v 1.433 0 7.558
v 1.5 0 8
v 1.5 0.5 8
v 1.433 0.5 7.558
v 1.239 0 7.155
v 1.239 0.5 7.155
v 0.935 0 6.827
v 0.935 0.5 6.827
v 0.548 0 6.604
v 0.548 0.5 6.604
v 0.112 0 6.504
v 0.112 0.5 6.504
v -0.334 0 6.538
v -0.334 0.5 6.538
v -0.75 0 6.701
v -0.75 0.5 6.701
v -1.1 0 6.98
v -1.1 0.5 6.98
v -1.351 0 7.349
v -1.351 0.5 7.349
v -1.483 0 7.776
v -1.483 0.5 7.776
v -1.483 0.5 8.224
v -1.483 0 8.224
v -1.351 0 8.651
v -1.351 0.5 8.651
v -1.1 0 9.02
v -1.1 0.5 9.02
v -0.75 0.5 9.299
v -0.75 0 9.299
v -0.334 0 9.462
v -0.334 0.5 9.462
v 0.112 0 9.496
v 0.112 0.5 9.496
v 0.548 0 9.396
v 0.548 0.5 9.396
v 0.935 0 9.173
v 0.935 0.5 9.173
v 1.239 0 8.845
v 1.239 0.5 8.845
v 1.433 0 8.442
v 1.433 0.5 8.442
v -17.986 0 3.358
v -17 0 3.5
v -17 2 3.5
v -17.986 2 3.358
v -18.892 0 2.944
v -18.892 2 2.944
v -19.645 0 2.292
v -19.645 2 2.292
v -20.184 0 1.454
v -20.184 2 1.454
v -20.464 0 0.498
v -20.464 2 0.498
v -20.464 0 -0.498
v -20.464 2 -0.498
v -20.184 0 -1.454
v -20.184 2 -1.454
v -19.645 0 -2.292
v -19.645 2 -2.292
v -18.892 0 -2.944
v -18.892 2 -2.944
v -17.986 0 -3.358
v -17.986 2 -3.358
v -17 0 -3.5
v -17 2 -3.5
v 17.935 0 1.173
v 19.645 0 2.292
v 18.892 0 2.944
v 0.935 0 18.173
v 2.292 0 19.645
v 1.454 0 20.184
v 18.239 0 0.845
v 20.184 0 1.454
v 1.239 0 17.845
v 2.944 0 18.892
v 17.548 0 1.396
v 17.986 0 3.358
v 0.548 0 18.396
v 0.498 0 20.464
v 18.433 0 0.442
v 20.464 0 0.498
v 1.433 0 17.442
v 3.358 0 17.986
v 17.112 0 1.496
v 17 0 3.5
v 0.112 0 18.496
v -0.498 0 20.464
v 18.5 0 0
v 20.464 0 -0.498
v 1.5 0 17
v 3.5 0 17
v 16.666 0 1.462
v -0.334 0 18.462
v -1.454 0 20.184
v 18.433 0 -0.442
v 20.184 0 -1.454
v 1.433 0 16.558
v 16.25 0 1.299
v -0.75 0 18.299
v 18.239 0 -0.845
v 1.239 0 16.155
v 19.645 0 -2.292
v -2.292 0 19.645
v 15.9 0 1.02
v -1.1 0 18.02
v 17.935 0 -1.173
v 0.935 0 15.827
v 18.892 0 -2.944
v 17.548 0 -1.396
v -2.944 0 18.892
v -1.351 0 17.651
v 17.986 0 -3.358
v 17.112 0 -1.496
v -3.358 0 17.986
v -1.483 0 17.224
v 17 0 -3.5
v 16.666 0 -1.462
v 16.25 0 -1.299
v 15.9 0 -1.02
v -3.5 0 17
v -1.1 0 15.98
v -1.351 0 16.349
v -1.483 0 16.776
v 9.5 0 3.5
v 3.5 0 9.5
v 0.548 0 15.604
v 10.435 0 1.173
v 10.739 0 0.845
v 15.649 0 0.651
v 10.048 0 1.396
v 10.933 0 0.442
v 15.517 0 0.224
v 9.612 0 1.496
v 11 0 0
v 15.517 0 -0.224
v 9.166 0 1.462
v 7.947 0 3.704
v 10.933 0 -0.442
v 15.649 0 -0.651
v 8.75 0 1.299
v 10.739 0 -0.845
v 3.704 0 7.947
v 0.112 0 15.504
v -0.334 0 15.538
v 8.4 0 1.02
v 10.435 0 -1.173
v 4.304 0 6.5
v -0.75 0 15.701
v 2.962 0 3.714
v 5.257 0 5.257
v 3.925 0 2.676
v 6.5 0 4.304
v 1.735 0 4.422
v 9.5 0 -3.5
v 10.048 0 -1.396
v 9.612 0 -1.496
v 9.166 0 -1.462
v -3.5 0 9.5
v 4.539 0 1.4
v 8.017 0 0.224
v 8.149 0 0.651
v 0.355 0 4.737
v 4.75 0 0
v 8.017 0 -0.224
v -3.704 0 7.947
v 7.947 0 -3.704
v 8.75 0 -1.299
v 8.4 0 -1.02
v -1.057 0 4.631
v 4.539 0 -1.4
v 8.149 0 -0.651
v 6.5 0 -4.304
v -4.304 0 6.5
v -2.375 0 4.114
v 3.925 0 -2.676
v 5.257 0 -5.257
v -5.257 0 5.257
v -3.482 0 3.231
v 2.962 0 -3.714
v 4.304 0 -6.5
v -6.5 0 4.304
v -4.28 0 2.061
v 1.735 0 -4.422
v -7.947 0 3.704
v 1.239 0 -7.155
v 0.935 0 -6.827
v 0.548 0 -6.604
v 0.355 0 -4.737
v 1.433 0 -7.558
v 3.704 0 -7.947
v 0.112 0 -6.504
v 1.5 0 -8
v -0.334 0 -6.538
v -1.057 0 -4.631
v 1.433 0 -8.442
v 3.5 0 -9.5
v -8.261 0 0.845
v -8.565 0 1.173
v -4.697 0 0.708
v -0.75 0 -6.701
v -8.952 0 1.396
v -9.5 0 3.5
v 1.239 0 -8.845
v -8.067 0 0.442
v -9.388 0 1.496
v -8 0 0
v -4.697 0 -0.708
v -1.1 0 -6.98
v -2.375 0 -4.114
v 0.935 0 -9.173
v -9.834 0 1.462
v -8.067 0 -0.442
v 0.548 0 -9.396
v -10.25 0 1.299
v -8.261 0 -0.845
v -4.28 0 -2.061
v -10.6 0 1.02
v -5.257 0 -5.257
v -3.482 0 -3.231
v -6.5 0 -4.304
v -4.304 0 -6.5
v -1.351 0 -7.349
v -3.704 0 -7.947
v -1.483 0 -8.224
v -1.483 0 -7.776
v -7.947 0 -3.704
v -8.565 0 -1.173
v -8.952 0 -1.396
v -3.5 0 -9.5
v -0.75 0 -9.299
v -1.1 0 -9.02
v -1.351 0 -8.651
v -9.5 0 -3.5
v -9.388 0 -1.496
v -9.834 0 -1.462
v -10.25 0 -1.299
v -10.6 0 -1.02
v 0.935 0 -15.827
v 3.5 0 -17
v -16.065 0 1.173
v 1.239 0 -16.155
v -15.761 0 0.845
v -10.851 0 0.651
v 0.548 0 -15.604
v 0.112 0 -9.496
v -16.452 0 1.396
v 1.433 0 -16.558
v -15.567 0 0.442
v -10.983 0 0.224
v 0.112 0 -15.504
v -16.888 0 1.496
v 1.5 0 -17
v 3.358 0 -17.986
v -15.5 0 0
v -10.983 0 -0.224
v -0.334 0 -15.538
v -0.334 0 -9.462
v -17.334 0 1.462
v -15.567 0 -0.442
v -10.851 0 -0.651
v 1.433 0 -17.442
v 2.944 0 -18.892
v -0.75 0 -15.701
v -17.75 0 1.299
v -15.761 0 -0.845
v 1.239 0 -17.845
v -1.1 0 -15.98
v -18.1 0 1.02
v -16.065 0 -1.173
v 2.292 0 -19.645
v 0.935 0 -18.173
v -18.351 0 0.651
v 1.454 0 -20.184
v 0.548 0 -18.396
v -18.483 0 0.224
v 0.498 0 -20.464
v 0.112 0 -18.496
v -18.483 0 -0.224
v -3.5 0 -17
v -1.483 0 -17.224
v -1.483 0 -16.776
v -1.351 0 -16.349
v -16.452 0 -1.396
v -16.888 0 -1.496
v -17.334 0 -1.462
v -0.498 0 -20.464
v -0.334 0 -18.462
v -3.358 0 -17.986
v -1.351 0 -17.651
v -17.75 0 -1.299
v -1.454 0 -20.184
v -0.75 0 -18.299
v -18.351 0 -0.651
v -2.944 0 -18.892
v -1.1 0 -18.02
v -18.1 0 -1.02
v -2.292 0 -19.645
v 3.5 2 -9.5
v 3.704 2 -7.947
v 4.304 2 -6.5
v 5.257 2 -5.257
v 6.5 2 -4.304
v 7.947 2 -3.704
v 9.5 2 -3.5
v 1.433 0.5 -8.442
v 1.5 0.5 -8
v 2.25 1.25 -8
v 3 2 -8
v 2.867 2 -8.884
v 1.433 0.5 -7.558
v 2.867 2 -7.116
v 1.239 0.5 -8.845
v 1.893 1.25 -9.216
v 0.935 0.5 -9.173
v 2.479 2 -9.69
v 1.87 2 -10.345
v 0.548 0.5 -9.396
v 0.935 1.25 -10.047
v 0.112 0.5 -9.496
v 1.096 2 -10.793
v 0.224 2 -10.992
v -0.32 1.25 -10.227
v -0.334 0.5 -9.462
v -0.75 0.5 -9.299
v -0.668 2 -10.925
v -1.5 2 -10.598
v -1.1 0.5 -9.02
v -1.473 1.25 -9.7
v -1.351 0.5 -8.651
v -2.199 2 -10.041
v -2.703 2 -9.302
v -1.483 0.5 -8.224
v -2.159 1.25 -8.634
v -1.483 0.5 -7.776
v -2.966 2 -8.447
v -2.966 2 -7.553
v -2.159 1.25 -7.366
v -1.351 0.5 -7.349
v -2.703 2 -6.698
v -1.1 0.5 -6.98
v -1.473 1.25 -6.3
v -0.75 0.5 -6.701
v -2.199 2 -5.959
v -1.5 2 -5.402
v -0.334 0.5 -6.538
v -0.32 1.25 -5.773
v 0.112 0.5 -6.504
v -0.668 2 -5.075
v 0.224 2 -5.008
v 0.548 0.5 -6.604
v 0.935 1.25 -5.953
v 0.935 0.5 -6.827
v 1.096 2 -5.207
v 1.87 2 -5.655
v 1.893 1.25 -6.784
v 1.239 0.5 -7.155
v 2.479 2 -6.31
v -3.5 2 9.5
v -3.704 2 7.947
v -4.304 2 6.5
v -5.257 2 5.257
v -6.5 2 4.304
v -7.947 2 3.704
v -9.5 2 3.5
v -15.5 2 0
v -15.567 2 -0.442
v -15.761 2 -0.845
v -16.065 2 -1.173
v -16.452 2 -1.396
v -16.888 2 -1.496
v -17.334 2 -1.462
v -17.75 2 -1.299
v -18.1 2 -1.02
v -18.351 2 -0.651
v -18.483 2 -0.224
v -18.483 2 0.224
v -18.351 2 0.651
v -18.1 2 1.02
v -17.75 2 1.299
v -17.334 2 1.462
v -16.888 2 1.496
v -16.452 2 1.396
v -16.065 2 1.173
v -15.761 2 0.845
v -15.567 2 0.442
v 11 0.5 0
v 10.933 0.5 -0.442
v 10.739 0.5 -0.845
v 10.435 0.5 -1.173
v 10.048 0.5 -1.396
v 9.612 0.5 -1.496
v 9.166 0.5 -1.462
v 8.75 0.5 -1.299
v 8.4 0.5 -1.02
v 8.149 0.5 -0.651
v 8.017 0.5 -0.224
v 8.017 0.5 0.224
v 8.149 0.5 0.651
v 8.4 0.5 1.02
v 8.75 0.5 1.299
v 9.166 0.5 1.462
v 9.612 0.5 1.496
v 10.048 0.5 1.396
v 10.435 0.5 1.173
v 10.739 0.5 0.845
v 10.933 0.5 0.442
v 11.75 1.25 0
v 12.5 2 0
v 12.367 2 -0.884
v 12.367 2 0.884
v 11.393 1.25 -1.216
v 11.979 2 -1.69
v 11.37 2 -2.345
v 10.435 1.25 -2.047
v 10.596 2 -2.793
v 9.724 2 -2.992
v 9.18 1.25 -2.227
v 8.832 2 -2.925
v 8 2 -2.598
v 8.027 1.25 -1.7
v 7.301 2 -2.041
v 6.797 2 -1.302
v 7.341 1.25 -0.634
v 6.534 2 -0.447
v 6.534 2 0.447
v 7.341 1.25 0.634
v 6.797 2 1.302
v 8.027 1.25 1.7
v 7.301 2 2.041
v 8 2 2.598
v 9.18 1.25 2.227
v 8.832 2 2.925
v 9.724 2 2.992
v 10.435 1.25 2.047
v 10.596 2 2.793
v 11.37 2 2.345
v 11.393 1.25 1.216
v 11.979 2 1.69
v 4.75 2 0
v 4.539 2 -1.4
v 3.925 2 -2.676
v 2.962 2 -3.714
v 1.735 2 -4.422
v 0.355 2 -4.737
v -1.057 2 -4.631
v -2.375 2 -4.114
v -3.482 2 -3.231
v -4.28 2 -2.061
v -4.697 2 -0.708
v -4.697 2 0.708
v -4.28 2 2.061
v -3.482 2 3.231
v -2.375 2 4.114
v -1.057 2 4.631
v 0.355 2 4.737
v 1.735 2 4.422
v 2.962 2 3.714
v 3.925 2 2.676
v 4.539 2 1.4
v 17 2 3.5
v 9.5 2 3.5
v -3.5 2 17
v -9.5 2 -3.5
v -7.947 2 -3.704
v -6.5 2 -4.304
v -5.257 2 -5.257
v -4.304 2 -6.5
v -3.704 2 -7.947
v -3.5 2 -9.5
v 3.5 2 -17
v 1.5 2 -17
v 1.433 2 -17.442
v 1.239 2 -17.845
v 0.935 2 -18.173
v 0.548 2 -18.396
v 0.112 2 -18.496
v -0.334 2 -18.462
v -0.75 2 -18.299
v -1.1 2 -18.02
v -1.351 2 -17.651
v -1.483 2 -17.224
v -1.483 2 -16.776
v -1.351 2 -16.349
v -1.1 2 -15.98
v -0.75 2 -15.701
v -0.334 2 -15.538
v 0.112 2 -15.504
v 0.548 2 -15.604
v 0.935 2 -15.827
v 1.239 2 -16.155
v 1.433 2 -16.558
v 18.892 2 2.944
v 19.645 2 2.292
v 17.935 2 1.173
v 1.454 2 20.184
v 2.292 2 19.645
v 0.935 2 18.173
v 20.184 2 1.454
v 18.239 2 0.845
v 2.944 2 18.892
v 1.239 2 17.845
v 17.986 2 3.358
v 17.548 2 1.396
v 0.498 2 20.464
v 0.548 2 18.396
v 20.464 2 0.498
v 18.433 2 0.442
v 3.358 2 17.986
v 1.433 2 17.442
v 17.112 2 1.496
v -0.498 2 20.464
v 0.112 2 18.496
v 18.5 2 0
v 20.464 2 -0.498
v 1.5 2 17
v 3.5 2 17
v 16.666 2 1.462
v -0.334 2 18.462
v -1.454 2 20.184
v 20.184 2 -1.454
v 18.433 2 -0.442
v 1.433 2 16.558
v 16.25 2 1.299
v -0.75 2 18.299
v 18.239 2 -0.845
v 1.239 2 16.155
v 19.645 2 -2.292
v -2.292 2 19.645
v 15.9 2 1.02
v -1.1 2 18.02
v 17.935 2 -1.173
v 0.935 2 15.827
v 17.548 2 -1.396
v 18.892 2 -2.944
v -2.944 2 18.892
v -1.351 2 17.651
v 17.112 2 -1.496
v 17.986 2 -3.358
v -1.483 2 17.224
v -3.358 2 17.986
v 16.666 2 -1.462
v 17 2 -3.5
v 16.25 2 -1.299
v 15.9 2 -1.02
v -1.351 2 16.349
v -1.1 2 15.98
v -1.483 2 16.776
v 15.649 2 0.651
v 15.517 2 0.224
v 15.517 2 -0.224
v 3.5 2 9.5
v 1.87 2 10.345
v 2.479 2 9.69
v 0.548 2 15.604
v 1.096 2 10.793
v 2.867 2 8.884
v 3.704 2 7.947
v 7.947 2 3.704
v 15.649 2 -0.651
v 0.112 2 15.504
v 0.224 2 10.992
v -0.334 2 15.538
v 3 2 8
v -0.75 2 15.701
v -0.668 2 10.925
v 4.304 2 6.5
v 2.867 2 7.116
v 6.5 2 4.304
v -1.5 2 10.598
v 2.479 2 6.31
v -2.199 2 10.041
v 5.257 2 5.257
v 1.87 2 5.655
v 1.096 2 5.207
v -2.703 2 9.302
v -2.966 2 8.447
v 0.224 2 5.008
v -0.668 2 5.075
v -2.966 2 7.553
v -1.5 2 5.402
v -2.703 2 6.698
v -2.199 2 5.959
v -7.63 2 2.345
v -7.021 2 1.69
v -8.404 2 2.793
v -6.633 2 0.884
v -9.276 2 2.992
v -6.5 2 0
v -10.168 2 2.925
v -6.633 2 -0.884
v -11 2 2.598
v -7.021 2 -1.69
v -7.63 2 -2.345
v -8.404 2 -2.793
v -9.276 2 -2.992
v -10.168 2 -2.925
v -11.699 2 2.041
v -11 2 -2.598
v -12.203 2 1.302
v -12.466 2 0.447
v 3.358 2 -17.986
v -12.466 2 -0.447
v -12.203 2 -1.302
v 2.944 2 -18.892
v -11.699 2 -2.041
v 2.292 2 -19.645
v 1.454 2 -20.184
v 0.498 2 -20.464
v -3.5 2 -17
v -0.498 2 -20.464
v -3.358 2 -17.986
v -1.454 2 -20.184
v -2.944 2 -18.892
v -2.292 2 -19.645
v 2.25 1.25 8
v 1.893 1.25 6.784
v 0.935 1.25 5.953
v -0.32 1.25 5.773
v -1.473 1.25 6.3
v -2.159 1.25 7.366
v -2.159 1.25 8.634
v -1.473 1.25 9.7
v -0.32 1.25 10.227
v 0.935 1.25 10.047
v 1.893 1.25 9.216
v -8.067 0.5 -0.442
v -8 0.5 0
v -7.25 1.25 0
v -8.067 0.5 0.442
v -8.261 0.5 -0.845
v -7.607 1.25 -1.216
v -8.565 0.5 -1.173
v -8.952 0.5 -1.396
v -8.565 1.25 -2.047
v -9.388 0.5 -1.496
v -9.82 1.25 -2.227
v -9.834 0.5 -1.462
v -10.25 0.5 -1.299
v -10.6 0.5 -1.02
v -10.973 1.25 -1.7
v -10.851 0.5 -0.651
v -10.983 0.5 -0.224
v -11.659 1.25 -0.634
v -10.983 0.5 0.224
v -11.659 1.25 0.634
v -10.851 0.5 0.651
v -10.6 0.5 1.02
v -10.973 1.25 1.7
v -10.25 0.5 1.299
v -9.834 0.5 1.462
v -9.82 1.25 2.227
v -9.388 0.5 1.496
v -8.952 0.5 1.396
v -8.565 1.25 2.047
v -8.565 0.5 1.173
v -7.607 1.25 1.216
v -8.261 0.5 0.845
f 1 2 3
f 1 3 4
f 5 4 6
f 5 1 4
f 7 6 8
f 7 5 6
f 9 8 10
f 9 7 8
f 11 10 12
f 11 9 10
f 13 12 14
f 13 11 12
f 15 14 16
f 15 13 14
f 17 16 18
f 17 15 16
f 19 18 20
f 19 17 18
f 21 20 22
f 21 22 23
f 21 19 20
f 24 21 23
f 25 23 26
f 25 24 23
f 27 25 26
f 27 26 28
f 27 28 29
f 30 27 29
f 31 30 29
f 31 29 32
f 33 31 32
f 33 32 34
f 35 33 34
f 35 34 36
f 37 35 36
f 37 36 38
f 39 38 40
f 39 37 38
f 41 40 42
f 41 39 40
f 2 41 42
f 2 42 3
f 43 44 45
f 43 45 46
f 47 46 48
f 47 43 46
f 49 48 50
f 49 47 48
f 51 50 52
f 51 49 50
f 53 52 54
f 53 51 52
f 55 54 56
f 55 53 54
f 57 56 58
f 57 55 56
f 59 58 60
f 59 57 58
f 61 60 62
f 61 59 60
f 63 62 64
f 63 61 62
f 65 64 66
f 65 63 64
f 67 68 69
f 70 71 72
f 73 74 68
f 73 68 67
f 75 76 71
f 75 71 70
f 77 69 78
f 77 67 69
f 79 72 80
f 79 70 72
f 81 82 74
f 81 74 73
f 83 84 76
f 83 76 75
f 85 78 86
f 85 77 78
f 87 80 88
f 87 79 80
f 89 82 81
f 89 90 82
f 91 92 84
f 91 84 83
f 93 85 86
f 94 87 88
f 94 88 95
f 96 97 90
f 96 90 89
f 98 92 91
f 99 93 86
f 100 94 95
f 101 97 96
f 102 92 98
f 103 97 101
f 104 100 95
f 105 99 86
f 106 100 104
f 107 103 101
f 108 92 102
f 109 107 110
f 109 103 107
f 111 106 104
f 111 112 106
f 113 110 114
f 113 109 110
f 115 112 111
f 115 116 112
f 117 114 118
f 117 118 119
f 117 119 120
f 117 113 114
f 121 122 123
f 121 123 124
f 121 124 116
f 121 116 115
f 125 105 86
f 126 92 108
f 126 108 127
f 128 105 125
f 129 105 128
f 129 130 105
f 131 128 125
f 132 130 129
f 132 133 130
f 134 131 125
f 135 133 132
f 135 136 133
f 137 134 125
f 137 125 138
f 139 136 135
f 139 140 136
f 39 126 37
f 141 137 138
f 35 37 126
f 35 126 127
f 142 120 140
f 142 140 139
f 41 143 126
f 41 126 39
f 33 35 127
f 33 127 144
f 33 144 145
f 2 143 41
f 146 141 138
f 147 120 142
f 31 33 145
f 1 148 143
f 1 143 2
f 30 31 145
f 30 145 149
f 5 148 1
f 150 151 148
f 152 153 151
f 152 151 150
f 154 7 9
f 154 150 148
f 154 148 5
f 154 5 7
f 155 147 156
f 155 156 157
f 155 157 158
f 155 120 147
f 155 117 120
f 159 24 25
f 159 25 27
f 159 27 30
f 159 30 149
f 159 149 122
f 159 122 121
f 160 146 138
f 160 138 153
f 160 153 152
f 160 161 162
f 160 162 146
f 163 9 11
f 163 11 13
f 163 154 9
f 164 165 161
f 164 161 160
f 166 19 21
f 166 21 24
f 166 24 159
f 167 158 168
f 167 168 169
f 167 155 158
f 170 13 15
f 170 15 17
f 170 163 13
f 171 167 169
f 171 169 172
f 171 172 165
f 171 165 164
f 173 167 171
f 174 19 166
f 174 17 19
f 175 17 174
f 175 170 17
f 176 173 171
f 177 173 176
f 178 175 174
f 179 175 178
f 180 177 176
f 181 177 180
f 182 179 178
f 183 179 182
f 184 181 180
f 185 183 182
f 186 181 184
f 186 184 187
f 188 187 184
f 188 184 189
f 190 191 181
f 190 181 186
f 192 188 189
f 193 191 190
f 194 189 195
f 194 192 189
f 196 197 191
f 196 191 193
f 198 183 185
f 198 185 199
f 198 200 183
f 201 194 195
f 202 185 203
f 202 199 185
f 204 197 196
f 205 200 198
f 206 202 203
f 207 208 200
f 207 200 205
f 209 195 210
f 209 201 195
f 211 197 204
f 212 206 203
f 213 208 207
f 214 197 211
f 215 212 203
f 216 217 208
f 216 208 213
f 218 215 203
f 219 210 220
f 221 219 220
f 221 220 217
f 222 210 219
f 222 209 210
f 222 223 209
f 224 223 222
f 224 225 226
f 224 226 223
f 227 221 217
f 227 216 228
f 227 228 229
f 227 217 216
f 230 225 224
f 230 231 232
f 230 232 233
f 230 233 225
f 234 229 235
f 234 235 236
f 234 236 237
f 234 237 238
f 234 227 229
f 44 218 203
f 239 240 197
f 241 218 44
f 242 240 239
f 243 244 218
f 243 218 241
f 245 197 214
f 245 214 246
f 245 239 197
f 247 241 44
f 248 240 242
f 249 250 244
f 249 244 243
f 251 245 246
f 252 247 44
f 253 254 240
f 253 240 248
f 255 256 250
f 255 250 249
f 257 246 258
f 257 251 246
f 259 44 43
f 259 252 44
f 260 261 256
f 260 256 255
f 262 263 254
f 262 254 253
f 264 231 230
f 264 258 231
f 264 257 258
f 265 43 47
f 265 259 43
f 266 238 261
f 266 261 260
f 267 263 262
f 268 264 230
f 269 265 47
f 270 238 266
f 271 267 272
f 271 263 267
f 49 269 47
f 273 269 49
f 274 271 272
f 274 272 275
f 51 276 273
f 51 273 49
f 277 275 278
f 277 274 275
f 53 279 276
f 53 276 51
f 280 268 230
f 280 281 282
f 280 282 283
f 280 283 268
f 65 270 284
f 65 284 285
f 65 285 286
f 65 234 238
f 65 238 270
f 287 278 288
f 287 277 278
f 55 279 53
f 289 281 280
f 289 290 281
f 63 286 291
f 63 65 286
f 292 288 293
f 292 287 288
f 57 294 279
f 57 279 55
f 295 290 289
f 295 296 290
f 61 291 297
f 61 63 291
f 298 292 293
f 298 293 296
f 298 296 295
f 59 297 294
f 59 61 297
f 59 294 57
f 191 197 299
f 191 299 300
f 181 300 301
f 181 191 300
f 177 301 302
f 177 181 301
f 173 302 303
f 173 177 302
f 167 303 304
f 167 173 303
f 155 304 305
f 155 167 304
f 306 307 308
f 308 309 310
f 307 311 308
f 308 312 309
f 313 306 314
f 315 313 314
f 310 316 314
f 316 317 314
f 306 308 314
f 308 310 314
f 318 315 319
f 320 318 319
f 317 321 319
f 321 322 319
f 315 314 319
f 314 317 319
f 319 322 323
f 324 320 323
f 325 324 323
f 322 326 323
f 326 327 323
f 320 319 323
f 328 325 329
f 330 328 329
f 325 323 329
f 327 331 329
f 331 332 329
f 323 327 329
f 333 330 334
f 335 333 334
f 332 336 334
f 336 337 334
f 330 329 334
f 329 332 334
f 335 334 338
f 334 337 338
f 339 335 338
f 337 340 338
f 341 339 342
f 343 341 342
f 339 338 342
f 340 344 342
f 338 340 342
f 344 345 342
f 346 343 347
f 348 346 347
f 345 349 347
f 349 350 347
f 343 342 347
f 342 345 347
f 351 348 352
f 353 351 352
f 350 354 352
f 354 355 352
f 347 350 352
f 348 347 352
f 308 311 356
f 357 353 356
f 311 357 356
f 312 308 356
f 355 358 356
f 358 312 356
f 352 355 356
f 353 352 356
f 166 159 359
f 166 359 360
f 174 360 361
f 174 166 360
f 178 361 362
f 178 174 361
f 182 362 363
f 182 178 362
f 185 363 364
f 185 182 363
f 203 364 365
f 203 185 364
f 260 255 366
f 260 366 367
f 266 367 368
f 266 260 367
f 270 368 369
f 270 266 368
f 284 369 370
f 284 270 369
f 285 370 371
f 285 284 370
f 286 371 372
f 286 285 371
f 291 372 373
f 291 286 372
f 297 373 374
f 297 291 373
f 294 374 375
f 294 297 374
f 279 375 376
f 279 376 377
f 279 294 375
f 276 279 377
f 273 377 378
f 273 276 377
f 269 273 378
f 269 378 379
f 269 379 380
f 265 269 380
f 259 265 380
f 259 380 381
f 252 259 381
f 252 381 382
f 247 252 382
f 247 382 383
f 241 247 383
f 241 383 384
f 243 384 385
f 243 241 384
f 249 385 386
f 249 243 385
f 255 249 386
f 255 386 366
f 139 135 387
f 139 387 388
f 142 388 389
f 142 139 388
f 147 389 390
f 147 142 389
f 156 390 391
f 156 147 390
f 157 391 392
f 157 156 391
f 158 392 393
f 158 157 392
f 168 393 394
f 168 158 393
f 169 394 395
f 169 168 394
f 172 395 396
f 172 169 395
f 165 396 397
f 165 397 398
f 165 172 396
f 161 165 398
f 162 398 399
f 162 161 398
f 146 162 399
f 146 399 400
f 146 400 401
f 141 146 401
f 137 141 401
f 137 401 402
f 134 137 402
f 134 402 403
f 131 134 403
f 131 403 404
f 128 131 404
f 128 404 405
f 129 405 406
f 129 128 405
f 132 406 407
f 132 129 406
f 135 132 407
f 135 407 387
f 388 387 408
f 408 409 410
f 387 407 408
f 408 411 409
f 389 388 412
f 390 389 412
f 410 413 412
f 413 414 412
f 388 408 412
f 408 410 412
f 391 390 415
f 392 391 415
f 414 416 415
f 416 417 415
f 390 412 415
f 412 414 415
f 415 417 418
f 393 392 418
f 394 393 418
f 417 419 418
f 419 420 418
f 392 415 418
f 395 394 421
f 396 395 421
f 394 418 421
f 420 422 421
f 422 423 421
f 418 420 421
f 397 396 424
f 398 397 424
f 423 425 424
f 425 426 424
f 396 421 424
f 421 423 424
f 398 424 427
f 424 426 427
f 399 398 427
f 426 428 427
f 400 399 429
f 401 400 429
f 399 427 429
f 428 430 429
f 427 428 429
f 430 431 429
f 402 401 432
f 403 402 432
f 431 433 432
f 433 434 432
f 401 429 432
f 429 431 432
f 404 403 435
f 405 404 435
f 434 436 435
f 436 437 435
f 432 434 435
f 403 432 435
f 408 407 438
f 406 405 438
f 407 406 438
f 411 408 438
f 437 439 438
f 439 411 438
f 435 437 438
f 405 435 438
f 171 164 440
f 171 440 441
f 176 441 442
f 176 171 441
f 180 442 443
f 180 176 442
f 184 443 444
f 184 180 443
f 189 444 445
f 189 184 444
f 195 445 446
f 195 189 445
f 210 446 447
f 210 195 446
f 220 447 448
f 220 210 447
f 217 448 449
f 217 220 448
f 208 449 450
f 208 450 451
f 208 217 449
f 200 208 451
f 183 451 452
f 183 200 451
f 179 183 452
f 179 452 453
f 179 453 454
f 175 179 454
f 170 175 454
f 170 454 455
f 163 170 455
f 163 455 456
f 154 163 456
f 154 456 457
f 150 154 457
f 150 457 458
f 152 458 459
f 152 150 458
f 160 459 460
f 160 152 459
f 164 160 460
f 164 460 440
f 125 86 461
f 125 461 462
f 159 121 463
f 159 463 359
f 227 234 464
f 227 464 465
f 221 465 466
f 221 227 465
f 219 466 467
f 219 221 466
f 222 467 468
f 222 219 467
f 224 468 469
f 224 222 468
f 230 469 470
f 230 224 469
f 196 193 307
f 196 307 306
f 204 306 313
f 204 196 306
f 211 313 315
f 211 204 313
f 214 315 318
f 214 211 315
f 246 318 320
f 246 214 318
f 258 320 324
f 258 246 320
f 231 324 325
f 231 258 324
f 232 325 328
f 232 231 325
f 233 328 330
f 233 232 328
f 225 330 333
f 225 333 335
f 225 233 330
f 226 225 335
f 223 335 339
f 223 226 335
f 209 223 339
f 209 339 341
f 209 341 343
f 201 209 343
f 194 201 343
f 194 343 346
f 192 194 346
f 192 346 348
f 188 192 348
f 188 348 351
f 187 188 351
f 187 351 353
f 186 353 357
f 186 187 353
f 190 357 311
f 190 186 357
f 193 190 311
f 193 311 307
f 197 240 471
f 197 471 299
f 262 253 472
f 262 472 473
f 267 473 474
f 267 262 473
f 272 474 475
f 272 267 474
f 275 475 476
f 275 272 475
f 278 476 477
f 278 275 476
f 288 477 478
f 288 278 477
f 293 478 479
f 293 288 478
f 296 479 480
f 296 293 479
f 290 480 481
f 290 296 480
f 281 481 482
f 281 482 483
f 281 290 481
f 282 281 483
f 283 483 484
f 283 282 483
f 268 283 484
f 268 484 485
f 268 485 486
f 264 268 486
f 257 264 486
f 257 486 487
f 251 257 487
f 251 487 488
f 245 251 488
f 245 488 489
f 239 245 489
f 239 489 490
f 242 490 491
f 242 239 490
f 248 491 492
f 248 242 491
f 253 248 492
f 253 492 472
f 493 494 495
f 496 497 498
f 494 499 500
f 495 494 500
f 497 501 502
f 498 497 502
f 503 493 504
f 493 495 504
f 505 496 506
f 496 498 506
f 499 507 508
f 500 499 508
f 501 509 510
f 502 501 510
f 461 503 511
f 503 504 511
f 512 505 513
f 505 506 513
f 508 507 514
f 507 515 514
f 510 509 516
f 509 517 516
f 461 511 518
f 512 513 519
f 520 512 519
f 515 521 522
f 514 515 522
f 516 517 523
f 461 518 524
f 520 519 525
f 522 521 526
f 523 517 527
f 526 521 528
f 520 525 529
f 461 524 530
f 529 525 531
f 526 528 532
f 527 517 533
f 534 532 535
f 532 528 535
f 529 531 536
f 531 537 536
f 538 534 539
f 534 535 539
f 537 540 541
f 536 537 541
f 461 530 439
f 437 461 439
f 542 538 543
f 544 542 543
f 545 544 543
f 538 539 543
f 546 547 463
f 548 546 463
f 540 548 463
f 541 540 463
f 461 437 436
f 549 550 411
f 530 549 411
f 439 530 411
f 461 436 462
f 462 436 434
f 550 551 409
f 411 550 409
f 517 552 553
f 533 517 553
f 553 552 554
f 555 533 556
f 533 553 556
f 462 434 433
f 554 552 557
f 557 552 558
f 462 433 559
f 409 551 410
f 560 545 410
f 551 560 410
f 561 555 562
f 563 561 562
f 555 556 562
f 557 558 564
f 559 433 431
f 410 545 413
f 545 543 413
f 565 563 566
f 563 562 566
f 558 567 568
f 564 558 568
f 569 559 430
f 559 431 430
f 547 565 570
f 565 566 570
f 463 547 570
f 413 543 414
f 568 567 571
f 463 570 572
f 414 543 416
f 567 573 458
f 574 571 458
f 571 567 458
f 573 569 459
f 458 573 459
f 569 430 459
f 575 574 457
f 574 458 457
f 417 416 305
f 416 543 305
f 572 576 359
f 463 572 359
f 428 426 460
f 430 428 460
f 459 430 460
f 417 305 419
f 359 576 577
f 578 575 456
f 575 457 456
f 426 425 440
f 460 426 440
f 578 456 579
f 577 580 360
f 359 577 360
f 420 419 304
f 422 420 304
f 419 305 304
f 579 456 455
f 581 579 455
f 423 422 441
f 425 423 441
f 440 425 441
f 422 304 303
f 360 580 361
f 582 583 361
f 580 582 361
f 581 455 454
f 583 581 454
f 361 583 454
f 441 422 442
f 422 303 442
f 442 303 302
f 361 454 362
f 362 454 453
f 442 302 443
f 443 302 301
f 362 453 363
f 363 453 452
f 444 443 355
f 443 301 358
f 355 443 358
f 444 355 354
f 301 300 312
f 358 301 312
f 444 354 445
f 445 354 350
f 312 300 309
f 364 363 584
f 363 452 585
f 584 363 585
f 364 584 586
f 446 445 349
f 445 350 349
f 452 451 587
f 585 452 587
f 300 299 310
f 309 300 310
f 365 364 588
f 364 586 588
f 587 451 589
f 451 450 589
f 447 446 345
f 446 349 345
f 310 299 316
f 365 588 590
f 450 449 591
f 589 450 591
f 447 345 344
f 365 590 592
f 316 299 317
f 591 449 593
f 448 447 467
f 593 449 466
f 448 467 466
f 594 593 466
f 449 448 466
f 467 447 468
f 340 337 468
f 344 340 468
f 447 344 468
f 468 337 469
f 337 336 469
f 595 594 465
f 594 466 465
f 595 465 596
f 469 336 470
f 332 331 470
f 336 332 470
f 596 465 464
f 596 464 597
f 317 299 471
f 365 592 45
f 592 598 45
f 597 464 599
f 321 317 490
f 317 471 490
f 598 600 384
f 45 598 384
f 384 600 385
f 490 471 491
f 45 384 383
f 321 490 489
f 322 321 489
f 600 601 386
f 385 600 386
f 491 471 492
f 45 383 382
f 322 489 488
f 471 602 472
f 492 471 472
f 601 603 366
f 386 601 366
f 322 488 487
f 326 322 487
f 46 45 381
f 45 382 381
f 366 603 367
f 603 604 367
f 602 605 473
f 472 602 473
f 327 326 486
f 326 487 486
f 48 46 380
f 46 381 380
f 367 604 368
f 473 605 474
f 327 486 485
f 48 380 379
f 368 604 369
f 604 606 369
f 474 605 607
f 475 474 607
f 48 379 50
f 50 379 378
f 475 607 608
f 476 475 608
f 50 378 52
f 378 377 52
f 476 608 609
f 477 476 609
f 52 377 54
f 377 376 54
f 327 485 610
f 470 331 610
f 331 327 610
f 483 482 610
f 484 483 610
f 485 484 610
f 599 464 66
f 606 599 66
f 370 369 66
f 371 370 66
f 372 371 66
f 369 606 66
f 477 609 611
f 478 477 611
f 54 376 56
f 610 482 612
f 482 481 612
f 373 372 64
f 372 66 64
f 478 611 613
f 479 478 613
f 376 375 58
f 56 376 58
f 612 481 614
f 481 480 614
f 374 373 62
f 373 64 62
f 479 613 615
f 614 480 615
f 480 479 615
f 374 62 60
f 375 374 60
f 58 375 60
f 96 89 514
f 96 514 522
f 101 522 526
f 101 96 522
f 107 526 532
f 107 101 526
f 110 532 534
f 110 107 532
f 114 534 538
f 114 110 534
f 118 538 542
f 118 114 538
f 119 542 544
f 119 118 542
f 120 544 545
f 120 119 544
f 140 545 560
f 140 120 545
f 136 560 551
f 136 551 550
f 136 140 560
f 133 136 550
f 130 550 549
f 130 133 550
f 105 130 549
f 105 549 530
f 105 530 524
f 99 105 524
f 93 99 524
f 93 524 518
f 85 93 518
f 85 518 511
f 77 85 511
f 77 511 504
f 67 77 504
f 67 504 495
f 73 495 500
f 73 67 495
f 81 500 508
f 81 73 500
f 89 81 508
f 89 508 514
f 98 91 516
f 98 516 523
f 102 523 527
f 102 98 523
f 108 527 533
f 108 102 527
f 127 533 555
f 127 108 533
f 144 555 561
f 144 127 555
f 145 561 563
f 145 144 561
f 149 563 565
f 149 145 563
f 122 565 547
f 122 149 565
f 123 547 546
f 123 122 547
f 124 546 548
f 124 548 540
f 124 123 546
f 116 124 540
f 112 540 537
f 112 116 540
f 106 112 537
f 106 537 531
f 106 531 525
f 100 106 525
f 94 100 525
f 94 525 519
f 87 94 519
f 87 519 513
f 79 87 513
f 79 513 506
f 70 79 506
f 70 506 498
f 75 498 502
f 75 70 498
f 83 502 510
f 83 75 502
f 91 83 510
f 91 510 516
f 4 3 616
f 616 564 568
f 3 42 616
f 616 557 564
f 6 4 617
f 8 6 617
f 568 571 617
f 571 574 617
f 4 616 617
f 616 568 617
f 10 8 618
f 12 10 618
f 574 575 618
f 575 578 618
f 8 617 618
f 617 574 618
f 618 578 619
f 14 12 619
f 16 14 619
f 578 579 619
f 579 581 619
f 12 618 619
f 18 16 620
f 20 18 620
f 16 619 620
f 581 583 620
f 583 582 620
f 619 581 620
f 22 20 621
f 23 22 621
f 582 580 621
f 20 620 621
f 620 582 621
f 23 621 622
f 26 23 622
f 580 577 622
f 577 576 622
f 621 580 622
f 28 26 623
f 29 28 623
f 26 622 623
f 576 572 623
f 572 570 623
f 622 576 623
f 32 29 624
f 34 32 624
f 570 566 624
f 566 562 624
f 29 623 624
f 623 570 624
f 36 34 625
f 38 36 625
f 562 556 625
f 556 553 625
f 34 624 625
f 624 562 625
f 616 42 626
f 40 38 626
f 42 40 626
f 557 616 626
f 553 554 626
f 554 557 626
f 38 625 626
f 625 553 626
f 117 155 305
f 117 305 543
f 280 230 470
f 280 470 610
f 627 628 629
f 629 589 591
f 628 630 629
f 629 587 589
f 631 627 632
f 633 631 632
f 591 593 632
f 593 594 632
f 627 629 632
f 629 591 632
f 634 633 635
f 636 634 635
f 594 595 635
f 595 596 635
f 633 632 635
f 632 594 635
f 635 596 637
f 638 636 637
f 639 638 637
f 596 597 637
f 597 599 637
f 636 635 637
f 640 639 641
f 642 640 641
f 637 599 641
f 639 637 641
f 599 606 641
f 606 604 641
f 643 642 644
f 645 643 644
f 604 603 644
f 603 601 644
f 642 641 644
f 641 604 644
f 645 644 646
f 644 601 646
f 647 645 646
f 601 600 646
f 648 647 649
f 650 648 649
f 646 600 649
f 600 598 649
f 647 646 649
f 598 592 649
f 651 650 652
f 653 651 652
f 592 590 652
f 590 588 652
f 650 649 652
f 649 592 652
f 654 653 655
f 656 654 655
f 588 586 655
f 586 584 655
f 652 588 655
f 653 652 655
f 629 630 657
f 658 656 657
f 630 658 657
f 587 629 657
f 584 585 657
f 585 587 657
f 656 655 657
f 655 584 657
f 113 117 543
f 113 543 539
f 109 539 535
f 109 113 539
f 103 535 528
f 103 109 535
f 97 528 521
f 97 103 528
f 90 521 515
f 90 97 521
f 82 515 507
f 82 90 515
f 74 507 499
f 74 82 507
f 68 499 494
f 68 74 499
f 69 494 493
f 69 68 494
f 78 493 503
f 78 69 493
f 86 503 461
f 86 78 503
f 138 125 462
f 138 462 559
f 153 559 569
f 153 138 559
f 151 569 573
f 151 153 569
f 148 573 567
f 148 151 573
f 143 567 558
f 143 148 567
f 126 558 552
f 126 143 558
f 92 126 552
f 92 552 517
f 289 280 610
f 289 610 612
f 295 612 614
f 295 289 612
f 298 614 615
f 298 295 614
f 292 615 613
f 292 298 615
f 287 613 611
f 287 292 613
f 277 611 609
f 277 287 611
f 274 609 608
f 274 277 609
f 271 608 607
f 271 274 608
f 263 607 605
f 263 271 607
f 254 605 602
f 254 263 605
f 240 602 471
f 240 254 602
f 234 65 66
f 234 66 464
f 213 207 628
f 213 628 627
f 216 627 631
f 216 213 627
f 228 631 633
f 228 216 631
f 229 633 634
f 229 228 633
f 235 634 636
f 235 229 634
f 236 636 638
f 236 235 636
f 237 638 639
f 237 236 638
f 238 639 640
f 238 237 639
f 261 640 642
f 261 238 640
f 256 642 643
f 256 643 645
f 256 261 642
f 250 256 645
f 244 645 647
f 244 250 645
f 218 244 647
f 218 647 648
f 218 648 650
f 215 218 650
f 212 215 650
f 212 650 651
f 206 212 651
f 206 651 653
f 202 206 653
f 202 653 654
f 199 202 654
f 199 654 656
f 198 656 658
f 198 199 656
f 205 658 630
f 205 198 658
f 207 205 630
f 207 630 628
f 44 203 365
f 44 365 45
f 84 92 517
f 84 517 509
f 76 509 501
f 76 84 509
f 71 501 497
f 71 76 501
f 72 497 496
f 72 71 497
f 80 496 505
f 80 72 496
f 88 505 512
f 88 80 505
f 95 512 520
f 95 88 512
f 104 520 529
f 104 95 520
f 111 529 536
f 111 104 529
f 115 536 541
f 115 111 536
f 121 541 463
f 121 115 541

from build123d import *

# Parameters (mm, degrees)
SKETCH1_R           = 4.75
SKETCH1_R_2         = 1.5
BOSS_EXTRUDE1_DEPTH = 2
CHAMFER1_SIZE       = 1.5


with BuildPart() as part:
    # Sketch1 → Boss-Extrude1 (new body)
    with BuildSketch(Plane(origin=(0, 0, 0), x_dir=(1, 0, 0), z_dir=(0, 1, 0))):
        with BuildLine():
            Line((3.5, 17), (3.5, 9.5))
            ThreePointArc((3.5, 9.5), (5.257359313, 5.257359313), (9.5, 3.5))
            Line((9.5, 3.5), (17, 3.5))
            ThreePointArc((17, 3.5), (20.5, 0), (17, -3.5))
            Line((17, -3.5), (9.5, -3.5))
            ThreePointArc((9.5, -3.5), (5.257359313, -5.257359313), (3.5, -9.5))
            Line((3.5, -9.5), (3.5, -17))
            ThreePointArc((3.5, -17), (0, -20.5), (-3.5, -17))
            Line((-3.5, -17), (-3.5, -9.5))
            ThreePointArc((-3.5, -9.5), (-5.257359313, -5.257359313), (-9.5, -3.5))
            Line((-9.5, -3.5), (-17, -3.5))
            ThreePointArc((-17, -3.5), (-20.5, 0), (-17, 3.5))
            Line((-17, 3.5), (-9.5, 3.5))
            ThreePointArc((-9.5, 3.5), (-5.257359313, 5.257359313), (-3.5, 9.5))
            Line((-3.5, 9.5), (-3.5, 17))
            ThreePointArc((-3.5, 17), (0, 20.5), (3.5, 17))
        make_face()
        Circle(SKETCH1_R, mode=Mode.SUBTRACT)
        with Locations((0, 8)):
            Circle(SKETCH1_R_2, mode=Mode.SUBTRACT)
        with Locations((0, 17)):
            Circle(SKETCH1_R_2, mode=Mode.SUBTRACT)
        with Locations((17, 0)):
            Circle(SKETCH1_R_2, mode=Mode.SUBTRACT)
        with Locations((9.5, 0)):
            Circle(SKETCH1_R_2, mode=Mode.SUBTRACT)
        with Locations((0, -17)):
            Circle(SKETCH1_R_2, mode=Mode.SUBTRACT)
        with Locations((0, -8)):
            Circle(SKETCH1_R_2, mode=Mode.SUBTRACT)
        with Locations((-17, 0)):
            Circle(SKETCH1_R_2, mode=Mode.SUBTRACT)
        with Locations((-9.5, 0)):
            Circle(SKETCH1_R_2, mode=Mode.SUBTRACT)
    extrude(amount=BOSS_EXTRUDE1_DEPTH)

    # Chamfer1
    chamfer1_edges = [part.edges().sort_by_distance(p)[0] for p in [
        (-1.5, 2, -8),
        (8, 2, 0),
        (-1.5, 2, 8),
        (-11, 2, 0),
    ]]
    chamfer(chamfer1_edges, length=CHAMFER1_SIZE)


solid = part.part
